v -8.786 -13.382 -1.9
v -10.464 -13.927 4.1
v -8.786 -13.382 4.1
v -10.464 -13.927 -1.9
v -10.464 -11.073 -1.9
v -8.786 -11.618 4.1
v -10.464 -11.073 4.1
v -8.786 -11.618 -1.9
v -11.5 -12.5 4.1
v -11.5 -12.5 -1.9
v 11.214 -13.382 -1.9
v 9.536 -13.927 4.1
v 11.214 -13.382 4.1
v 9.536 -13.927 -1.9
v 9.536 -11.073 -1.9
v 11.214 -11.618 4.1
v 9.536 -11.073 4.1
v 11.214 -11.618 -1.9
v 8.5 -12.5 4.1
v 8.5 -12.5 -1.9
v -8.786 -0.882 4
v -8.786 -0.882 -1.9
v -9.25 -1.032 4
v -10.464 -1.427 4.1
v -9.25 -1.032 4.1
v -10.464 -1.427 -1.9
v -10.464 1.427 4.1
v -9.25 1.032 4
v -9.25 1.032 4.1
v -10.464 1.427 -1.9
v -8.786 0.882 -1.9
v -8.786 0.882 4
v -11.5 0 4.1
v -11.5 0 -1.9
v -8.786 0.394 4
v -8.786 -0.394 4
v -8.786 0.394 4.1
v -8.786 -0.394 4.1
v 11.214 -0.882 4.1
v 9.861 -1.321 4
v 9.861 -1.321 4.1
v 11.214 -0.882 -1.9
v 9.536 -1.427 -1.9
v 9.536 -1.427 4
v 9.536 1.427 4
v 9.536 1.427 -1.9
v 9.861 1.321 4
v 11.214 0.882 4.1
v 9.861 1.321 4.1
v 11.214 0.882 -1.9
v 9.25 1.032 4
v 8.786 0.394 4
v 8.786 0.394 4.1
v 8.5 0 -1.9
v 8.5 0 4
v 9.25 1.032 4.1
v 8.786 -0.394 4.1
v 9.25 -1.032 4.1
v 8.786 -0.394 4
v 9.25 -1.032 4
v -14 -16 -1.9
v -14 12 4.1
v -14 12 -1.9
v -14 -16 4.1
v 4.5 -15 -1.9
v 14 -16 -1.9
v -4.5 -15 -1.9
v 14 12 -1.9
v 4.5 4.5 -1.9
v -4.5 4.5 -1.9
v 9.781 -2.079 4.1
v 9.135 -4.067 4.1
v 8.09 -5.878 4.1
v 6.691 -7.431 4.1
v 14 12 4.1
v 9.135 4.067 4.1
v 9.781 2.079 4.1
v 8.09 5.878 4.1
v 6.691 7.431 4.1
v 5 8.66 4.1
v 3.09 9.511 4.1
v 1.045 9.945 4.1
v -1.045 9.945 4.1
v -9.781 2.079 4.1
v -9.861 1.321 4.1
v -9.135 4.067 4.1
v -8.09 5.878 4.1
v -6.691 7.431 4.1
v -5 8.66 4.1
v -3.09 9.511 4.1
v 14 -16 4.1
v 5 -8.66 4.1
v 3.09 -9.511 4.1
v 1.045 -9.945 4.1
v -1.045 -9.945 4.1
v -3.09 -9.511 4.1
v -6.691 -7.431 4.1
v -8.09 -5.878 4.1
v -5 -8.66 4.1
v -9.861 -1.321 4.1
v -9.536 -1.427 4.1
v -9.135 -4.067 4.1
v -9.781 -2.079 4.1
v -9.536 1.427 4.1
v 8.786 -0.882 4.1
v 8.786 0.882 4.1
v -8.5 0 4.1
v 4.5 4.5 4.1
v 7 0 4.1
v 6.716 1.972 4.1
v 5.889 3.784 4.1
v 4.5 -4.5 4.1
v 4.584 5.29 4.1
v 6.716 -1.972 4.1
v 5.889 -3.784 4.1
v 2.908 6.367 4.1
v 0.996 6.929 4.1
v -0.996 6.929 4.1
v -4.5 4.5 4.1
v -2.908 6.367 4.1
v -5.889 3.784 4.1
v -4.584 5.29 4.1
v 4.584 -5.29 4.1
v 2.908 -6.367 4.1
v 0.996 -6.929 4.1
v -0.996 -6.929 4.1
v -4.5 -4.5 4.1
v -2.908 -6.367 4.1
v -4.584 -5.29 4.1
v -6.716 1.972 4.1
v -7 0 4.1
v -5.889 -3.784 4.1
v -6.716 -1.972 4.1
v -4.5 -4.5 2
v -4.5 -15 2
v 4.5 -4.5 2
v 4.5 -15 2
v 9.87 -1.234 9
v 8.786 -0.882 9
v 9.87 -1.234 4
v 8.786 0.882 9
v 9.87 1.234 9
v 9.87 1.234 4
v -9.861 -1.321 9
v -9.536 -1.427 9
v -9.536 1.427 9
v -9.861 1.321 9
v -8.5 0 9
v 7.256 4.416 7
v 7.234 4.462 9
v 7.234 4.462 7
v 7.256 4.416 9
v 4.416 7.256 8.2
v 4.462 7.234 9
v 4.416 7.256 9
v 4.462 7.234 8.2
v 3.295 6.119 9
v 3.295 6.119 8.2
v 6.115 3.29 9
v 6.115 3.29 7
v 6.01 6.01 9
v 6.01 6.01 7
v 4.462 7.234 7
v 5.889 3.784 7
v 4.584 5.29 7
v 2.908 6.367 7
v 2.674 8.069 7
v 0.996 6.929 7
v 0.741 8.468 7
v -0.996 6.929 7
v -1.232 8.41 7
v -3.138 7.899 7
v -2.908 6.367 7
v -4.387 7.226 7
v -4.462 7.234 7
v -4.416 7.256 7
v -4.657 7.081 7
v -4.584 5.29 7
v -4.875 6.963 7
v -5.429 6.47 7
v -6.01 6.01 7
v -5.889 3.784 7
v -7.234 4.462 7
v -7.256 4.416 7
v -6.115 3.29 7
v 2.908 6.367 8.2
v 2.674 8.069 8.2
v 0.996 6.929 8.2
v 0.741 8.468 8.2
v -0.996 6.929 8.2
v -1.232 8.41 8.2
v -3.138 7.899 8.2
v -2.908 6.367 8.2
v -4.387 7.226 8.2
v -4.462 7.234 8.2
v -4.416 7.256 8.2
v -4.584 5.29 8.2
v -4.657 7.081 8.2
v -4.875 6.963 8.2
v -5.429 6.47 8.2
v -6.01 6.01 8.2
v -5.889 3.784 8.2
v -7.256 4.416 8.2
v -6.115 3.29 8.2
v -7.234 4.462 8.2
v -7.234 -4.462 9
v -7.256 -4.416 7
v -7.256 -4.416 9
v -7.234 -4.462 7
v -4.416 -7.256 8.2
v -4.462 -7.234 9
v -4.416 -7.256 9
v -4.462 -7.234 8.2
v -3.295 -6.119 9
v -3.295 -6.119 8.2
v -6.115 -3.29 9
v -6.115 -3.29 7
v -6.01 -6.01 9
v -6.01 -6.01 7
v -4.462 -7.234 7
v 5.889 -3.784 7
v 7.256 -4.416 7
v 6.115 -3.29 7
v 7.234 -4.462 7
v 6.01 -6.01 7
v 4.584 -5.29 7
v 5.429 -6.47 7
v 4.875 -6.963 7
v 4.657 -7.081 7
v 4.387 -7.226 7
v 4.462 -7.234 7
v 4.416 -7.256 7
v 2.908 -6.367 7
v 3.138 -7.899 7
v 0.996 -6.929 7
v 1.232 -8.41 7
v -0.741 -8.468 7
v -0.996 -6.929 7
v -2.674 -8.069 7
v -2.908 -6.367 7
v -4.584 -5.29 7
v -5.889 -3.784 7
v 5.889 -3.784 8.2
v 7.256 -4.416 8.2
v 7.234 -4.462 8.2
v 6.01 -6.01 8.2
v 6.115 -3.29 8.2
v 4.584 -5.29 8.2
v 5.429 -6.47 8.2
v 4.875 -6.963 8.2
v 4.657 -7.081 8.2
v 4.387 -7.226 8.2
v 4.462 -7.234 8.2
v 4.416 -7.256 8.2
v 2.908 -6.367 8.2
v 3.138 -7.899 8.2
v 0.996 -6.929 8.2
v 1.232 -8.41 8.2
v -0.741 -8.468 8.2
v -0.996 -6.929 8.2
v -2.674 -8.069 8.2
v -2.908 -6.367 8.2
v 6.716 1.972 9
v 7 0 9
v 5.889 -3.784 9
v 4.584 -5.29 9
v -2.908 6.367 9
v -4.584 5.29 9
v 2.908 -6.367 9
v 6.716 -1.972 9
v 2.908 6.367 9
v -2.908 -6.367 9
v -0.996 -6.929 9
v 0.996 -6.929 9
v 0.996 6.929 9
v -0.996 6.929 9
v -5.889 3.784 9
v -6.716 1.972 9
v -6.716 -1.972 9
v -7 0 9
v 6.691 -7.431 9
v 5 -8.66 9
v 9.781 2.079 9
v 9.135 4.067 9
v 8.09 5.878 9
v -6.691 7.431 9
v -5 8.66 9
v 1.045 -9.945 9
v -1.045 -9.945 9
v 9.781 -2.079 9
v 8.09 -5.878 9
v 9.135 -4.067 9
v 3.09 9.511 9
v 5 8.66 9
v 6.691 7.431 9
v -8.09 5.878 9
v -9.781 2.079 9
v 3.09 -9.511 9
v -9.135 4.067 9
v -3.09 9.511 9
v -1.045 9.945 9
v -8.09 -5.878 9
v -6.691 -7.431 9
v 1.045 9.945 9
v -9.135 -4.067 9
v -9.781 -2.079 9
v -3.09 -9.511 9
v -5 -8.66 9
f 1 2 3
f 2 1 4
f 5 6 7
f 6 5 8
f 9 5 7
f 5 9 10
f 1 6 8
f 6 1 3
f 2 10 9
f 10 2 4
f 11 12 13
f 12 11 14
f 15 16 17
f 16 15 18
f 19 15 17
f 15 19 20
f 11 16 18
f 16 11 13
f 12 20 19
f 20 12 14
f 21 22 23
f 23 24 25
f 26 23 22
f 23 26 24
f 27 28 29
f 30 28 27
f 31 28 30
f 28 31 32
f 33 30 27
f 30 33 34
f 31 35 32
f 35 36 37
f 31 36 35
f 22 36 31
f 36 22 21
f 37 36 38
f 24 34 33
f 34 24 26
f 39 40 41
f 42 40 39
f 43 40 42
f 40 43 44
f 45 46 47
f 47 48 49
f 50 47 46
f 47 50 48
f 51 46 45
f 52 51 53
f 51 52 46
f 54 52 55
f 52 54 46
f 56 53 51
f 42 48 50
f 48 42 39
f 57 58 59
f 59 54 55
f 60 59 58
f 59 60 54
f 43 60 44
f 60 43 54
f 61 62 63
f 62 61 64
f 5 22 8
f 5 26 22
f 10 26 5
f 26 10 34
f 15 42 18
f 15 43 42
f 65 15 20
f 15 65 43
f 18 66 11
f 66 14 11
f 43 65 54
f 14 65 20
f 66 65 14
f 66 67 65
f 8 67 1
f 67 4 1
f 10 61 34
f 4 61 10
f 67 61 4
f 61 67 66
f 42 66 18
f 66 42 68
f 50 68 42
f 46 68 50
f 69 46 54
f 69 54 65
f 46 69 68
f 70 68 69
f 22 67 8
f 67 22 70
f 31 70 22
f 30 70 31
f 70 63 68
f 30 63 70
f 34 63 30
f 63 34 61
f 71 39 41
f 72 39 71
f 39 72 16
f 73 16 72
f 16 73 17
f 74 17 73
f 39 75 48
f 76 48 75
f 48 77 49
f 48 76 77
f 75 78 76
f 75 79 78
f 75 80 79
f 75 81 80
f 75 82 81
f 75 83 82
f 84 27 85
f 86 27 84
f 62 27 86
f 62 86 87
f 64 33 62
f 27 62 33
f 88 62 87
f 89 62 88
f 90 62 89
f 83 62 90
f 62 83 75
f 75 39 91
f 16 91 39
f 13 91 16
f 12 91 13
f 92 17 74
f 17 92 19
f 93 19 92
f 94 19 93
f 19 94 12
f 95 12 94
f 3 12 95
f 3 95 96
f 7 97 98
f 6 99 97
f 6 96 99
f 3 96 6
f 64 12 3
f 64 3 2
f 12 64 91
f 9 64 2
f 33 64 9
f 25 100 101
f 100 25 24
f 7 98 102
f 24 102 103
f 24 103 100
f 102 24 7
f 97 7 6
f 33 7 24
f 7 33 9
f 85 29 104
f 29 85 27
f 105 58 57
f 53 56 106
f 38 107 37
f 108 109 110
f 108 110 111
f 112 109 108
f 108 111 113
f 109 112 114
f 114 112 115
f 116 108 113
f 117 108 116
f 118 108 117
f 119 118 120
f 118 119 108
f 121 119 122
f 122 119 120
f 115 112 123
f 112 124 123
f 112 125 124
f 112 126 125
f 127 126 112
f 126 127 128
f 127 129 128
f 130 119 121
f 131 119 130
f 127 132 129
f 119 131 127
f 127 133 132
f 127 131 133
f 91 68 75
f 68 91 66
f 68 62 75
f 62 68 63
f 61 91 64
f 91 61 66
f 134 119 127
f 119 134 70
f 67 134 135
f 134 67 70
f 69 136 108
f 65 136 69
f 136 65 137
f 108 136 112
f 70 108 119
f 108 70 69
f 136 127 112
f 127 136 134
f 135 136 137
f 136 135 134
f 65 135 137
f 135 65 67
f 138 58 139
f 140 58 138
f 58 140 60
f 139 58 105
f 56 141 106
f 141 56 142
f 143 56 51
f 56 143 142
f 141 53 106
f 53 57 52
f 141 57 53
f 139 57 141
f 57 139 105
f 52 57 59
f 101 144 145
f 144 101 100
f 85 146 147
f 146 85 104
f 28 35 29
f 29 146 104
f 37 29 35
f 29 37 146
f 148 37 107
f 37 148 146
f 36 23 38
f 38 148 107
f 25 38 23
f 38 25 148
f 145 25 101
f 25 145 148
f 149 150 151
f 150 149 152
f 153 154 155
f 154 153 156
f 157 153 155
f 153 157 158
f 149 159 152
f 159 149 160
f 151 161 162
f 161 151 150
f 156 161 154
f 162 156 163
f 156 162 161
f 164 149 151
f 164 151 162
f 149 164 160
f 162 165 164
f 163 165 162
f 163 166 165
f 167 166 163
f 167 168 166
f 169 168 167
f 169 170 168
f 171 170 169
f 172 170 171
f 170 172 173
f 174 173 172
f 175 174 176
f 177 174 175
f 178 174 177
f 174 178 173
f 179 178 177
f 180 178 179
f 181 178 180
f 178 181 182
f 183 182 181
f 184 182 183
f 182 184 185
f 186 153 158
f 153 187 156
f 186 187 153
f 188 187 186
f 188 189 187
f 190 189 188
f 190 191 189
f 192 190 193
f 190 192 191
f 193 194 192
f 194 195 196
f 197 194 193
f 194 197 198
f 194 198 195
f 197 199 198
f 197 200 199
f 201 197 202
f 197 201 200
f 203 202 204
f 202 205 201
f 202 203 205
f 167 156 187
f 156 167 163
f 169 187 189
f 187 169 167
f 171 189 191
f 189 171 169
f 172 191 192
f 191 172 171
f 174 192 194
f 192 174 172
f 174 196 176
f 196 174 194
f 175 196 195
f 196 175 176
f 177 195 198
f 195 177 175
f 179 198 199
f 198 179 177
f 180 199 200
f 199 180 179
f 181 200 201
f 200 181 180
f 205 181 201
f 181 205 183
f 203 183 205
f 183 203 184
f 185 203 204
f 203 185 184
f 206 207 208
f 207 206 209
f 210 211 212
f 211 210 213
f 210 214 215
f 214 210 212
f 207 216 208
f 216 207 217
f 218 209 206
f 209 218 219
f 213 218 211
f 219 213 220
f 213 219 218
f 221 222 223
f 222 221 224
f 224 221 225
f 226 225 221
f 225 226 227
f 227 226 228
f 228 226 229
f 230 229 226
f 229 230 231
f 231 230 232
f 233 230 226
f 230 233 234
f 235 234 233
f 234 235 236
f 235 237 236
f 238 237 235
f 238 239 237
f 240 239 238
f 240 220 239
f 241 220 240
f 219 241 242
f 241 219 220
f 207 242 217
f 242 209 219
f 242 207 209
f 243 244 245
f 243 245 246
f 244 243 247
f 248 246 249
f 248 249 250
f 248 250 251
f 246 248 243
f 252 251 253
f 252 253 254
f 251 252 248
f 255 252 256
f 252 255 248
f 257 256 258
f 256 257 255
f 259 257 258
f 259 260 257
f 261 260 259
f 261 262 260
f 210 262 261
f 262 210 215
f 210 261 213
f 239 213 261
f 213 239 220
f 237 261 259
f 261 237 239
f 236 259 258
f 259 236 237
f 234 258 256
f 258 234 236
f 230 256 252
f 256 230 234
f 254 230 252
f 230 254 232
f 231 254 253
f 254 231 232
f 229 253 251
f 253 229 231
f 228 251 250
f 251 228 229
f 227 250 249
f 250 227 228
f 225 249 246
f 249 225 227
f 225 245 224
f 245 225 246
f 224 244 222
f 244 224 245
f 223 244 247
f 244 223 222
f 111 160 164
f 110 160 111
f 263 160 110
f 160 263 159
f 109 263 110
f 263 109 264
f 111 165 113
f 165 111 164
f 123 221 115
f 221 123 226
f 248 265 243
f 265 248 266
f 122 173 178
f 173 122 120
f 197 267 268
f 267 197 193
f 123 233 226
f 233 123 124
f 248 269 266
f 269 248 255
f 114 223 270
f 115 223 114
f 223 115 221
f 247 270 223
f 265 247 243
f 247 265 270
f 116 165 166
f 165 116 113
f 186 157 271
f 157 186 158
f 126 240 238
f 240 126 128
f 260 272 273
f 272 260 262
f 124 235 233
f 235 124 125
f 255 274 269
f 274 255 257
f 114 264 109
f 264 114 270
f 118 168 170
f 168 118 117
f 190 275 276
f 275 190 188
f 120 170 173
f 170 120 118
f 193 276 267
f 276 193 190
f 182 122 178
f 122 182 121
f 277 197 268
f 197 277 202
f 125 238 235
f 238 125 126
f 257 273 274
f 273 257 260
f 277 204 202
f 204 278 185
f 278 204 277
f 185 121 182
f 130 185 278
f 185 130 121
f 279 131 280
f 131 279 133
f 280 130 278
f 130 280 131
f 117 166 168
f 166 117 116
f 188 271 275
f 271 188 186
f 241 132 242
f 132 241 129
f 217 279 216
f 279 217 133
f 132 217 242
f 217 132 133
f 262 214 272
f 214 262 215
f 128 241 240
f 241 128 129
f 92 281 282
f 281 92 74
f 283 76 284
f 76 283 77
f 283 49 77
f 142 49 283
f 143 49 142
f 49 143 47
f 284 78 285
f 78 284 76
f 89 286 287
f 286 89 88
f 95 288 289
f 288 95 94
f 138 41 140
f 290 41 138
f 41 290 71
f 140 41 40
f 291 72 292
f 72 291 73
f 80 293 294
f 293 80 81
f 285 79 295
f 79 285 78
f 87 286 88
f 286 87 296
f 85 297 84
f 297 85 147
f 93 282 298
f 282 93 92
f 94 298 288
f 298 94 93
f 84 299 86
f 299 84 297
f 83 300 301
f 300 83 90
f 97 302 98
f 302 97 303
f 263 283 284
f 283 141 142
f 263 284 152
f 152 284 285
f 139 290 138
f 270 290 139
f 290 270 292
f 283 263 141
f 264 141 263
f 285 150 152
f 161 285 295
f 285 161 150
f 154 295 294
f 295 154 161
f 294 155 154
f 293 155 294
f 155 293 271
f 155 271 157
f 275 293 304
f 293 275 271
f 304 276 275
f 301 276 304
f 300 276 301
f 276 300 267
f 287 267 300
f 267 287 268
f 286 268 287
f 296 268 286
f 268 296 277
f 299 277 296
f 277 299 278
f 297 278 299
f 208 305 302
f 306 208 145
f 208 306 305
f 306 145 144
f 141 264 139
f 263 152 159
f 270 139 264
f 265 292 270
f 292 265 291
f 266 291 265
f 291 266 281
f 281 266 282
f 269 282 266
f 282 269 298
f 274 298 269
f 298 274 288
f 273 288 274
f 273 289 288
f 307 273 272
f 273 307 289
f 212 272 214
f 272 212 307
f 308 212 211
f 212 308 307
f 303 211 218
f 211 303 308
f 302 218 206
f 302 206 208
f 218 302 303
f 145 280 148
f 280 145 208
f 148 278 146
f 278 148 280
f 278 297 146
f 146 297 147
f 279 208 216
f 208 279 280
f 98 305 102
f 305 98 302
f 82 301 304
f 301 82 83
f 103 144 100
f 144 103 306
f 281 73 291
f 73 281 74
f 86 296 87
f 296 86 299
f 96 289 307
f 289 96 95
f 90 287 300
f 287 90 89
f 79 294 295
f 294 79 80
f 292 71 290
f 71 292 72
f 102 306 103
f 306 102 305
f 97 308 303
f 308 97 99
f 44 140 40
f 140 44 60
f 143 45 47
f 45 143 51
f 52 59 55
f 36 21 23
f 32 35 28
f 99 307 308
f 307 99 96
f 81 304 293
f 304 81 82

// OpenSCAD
// file: ../primitives/point.scad
module 2DPoint(x, y)
{
  translate([x, y])
    circle(r=0.01);
}

module 3DPoint(x, y, z)
{
  translate([x, y, z])
    sphere(r=0.01);
}
// file: ../primitives/circle_slice.scad
include <point.scad>

module Linear2DCircleSlice(radius, width)
{
  intersection()
  {
    circle(r = radius);
    hull()
    {
      translate([radius, 0, 0])
      {
        2DPoint(0, width/2);
        2DPoint(0, -width/2);
      }
      circle(r = width/2);
    }
  }
}

module Angular2DCircleSlice(radius, angle)
{
  intersection()
  {
    circle(r = radius);
    hull()
    {
      translate([radius, 0, 0])
        2DPoint(radius, 0);
      rotate([0, 0, angle])
        translate([radius, 0, 0])
          2DPoint(radius, 0);
      2DPoint(0, 0);
    }
  }
}
// file: BubbleScopeMount.scad
include <../primitives/circle_slice.scad>

module scope_threads(scope_radius, scope_mount_height, angle, carrier_width, carrier_height)
{
  rad = scope_radius + 1.5;
  rotate([0, 0, angle])
  {
    translate([0, 0, scope_mount_height-1.5])
      linear_extrude(height = carrier_height+1)
        Linear2DCircleSlice(rad, carrier_width);

    translate([0, 0, scope_mount_height-2])
      linear_extrude(height = carrier_height)
      {
        Linear2DCircleSlice(rad, carrier_width);
        rotate([0, 0, 90])
          Linear2DCircleSlice(rad, carrier_width);
        intersection()
        {
          circle(rad);
          square([rad, rad]);
        }
      }
  }
}

module scope_bracket(scope_radius, scope_mount_height)
{
  translate([0, 0, -1])
    cylinder(r=scope_radius, h=scope_mount_height+2);
  scope_threads(scope_radius, scope_mount_height, 45, 4, 1.2);
  scope_threads(scope_radius, scope_mount_height, -135, 4, 1.2);
}

module bubblescope_mount()
{
  difference()
  {
    cylinder(r=10, h=5);
    scope_bracket(7, 5);
  }
}
// file: ../primitives/rounded_rect.scad
module RoundedRect(x, y, z, r, centre=false)
{
  module OriginRect(x, y, z, r)
  {
    upper_x = x - r;
    upper_y = y - r;
    hull()
    {
      translate([r, r, 0])
        cylinder(r=r, h=z);
      translate([upper_x, r, 0])
        cylinder(r=r, h=z);
      translate([r, upper_y, 0])
        cylinder(r=r, h=z);
      translate([upper_x, upper_y, 0])
        cylinder(r=r, h=z);
    }
  }

  module CentreRect(x, y, z, r)
  {
    cx = (x / 2) - r;
    cy = (y / 2) - r;
    cz = -(z / 2);
    hull()
    {
      translate([-cx, -cy, cz])
        cylinder(r=r, h=z);
      translate([-cx, cy, cz])
        cylinder(r=r, h=z);
      translate([cx, -cy, cz])
        cylinder(r=r, h=z);
      translate([cx, cy, cz])
        cylinder(r=r, h=z);
    }
  }
  
  if(centre)
    CentreRect(x, y, z, r);
  else
    OriginRect(x, y, z, r);
}
// main file
include <../primitives/rounded_rect.scad>
include <BubbleScopeMount.scad>

module chipOpening() {
	clearance = 0.5;
	c = 2 * clearance;
	translate([0,-9.5,0])
		cube(size=[8+c,10+c,4],center=true);
}

module lensOpening() {
	clearance = 0.5;
	c = 2 * clearance;
	translate([0, 0, -0.5])
		cube(size=[8+c,8+c,12], center=true);
}

module mountingHoles()
{
	dx = 10;
	radius = 1.5;
	dz = -10;
	translate([dx, -12.5, dz])
		cylinder(r=radius, h=20);
	translate([-dx, -12.5, dz])
		cylinder(r=radius, h=20);
	translate([dx, 0, dz])
		cylinder(r=radius, h=20);
	translate([-dx, 0, dz])
		cylinder(r=radius, h=20);
}

module piCameraAdapter() {
	difference() {
		difference() {
			translate([0, -2, -1.1])
				cube([28, 28, 6], center=true);
			mountingHoles();
			lensOpening();
			chipOpening();
		}
	}
}

rotate([0, 180, 0])
	union()
	{
		piCameraAdapter();
		rotate([0, 180, 0])
			translate([0, 0, 4])
				difference()
				{
					bubblescope_mount();
					mountingHoles();
				}
	}
